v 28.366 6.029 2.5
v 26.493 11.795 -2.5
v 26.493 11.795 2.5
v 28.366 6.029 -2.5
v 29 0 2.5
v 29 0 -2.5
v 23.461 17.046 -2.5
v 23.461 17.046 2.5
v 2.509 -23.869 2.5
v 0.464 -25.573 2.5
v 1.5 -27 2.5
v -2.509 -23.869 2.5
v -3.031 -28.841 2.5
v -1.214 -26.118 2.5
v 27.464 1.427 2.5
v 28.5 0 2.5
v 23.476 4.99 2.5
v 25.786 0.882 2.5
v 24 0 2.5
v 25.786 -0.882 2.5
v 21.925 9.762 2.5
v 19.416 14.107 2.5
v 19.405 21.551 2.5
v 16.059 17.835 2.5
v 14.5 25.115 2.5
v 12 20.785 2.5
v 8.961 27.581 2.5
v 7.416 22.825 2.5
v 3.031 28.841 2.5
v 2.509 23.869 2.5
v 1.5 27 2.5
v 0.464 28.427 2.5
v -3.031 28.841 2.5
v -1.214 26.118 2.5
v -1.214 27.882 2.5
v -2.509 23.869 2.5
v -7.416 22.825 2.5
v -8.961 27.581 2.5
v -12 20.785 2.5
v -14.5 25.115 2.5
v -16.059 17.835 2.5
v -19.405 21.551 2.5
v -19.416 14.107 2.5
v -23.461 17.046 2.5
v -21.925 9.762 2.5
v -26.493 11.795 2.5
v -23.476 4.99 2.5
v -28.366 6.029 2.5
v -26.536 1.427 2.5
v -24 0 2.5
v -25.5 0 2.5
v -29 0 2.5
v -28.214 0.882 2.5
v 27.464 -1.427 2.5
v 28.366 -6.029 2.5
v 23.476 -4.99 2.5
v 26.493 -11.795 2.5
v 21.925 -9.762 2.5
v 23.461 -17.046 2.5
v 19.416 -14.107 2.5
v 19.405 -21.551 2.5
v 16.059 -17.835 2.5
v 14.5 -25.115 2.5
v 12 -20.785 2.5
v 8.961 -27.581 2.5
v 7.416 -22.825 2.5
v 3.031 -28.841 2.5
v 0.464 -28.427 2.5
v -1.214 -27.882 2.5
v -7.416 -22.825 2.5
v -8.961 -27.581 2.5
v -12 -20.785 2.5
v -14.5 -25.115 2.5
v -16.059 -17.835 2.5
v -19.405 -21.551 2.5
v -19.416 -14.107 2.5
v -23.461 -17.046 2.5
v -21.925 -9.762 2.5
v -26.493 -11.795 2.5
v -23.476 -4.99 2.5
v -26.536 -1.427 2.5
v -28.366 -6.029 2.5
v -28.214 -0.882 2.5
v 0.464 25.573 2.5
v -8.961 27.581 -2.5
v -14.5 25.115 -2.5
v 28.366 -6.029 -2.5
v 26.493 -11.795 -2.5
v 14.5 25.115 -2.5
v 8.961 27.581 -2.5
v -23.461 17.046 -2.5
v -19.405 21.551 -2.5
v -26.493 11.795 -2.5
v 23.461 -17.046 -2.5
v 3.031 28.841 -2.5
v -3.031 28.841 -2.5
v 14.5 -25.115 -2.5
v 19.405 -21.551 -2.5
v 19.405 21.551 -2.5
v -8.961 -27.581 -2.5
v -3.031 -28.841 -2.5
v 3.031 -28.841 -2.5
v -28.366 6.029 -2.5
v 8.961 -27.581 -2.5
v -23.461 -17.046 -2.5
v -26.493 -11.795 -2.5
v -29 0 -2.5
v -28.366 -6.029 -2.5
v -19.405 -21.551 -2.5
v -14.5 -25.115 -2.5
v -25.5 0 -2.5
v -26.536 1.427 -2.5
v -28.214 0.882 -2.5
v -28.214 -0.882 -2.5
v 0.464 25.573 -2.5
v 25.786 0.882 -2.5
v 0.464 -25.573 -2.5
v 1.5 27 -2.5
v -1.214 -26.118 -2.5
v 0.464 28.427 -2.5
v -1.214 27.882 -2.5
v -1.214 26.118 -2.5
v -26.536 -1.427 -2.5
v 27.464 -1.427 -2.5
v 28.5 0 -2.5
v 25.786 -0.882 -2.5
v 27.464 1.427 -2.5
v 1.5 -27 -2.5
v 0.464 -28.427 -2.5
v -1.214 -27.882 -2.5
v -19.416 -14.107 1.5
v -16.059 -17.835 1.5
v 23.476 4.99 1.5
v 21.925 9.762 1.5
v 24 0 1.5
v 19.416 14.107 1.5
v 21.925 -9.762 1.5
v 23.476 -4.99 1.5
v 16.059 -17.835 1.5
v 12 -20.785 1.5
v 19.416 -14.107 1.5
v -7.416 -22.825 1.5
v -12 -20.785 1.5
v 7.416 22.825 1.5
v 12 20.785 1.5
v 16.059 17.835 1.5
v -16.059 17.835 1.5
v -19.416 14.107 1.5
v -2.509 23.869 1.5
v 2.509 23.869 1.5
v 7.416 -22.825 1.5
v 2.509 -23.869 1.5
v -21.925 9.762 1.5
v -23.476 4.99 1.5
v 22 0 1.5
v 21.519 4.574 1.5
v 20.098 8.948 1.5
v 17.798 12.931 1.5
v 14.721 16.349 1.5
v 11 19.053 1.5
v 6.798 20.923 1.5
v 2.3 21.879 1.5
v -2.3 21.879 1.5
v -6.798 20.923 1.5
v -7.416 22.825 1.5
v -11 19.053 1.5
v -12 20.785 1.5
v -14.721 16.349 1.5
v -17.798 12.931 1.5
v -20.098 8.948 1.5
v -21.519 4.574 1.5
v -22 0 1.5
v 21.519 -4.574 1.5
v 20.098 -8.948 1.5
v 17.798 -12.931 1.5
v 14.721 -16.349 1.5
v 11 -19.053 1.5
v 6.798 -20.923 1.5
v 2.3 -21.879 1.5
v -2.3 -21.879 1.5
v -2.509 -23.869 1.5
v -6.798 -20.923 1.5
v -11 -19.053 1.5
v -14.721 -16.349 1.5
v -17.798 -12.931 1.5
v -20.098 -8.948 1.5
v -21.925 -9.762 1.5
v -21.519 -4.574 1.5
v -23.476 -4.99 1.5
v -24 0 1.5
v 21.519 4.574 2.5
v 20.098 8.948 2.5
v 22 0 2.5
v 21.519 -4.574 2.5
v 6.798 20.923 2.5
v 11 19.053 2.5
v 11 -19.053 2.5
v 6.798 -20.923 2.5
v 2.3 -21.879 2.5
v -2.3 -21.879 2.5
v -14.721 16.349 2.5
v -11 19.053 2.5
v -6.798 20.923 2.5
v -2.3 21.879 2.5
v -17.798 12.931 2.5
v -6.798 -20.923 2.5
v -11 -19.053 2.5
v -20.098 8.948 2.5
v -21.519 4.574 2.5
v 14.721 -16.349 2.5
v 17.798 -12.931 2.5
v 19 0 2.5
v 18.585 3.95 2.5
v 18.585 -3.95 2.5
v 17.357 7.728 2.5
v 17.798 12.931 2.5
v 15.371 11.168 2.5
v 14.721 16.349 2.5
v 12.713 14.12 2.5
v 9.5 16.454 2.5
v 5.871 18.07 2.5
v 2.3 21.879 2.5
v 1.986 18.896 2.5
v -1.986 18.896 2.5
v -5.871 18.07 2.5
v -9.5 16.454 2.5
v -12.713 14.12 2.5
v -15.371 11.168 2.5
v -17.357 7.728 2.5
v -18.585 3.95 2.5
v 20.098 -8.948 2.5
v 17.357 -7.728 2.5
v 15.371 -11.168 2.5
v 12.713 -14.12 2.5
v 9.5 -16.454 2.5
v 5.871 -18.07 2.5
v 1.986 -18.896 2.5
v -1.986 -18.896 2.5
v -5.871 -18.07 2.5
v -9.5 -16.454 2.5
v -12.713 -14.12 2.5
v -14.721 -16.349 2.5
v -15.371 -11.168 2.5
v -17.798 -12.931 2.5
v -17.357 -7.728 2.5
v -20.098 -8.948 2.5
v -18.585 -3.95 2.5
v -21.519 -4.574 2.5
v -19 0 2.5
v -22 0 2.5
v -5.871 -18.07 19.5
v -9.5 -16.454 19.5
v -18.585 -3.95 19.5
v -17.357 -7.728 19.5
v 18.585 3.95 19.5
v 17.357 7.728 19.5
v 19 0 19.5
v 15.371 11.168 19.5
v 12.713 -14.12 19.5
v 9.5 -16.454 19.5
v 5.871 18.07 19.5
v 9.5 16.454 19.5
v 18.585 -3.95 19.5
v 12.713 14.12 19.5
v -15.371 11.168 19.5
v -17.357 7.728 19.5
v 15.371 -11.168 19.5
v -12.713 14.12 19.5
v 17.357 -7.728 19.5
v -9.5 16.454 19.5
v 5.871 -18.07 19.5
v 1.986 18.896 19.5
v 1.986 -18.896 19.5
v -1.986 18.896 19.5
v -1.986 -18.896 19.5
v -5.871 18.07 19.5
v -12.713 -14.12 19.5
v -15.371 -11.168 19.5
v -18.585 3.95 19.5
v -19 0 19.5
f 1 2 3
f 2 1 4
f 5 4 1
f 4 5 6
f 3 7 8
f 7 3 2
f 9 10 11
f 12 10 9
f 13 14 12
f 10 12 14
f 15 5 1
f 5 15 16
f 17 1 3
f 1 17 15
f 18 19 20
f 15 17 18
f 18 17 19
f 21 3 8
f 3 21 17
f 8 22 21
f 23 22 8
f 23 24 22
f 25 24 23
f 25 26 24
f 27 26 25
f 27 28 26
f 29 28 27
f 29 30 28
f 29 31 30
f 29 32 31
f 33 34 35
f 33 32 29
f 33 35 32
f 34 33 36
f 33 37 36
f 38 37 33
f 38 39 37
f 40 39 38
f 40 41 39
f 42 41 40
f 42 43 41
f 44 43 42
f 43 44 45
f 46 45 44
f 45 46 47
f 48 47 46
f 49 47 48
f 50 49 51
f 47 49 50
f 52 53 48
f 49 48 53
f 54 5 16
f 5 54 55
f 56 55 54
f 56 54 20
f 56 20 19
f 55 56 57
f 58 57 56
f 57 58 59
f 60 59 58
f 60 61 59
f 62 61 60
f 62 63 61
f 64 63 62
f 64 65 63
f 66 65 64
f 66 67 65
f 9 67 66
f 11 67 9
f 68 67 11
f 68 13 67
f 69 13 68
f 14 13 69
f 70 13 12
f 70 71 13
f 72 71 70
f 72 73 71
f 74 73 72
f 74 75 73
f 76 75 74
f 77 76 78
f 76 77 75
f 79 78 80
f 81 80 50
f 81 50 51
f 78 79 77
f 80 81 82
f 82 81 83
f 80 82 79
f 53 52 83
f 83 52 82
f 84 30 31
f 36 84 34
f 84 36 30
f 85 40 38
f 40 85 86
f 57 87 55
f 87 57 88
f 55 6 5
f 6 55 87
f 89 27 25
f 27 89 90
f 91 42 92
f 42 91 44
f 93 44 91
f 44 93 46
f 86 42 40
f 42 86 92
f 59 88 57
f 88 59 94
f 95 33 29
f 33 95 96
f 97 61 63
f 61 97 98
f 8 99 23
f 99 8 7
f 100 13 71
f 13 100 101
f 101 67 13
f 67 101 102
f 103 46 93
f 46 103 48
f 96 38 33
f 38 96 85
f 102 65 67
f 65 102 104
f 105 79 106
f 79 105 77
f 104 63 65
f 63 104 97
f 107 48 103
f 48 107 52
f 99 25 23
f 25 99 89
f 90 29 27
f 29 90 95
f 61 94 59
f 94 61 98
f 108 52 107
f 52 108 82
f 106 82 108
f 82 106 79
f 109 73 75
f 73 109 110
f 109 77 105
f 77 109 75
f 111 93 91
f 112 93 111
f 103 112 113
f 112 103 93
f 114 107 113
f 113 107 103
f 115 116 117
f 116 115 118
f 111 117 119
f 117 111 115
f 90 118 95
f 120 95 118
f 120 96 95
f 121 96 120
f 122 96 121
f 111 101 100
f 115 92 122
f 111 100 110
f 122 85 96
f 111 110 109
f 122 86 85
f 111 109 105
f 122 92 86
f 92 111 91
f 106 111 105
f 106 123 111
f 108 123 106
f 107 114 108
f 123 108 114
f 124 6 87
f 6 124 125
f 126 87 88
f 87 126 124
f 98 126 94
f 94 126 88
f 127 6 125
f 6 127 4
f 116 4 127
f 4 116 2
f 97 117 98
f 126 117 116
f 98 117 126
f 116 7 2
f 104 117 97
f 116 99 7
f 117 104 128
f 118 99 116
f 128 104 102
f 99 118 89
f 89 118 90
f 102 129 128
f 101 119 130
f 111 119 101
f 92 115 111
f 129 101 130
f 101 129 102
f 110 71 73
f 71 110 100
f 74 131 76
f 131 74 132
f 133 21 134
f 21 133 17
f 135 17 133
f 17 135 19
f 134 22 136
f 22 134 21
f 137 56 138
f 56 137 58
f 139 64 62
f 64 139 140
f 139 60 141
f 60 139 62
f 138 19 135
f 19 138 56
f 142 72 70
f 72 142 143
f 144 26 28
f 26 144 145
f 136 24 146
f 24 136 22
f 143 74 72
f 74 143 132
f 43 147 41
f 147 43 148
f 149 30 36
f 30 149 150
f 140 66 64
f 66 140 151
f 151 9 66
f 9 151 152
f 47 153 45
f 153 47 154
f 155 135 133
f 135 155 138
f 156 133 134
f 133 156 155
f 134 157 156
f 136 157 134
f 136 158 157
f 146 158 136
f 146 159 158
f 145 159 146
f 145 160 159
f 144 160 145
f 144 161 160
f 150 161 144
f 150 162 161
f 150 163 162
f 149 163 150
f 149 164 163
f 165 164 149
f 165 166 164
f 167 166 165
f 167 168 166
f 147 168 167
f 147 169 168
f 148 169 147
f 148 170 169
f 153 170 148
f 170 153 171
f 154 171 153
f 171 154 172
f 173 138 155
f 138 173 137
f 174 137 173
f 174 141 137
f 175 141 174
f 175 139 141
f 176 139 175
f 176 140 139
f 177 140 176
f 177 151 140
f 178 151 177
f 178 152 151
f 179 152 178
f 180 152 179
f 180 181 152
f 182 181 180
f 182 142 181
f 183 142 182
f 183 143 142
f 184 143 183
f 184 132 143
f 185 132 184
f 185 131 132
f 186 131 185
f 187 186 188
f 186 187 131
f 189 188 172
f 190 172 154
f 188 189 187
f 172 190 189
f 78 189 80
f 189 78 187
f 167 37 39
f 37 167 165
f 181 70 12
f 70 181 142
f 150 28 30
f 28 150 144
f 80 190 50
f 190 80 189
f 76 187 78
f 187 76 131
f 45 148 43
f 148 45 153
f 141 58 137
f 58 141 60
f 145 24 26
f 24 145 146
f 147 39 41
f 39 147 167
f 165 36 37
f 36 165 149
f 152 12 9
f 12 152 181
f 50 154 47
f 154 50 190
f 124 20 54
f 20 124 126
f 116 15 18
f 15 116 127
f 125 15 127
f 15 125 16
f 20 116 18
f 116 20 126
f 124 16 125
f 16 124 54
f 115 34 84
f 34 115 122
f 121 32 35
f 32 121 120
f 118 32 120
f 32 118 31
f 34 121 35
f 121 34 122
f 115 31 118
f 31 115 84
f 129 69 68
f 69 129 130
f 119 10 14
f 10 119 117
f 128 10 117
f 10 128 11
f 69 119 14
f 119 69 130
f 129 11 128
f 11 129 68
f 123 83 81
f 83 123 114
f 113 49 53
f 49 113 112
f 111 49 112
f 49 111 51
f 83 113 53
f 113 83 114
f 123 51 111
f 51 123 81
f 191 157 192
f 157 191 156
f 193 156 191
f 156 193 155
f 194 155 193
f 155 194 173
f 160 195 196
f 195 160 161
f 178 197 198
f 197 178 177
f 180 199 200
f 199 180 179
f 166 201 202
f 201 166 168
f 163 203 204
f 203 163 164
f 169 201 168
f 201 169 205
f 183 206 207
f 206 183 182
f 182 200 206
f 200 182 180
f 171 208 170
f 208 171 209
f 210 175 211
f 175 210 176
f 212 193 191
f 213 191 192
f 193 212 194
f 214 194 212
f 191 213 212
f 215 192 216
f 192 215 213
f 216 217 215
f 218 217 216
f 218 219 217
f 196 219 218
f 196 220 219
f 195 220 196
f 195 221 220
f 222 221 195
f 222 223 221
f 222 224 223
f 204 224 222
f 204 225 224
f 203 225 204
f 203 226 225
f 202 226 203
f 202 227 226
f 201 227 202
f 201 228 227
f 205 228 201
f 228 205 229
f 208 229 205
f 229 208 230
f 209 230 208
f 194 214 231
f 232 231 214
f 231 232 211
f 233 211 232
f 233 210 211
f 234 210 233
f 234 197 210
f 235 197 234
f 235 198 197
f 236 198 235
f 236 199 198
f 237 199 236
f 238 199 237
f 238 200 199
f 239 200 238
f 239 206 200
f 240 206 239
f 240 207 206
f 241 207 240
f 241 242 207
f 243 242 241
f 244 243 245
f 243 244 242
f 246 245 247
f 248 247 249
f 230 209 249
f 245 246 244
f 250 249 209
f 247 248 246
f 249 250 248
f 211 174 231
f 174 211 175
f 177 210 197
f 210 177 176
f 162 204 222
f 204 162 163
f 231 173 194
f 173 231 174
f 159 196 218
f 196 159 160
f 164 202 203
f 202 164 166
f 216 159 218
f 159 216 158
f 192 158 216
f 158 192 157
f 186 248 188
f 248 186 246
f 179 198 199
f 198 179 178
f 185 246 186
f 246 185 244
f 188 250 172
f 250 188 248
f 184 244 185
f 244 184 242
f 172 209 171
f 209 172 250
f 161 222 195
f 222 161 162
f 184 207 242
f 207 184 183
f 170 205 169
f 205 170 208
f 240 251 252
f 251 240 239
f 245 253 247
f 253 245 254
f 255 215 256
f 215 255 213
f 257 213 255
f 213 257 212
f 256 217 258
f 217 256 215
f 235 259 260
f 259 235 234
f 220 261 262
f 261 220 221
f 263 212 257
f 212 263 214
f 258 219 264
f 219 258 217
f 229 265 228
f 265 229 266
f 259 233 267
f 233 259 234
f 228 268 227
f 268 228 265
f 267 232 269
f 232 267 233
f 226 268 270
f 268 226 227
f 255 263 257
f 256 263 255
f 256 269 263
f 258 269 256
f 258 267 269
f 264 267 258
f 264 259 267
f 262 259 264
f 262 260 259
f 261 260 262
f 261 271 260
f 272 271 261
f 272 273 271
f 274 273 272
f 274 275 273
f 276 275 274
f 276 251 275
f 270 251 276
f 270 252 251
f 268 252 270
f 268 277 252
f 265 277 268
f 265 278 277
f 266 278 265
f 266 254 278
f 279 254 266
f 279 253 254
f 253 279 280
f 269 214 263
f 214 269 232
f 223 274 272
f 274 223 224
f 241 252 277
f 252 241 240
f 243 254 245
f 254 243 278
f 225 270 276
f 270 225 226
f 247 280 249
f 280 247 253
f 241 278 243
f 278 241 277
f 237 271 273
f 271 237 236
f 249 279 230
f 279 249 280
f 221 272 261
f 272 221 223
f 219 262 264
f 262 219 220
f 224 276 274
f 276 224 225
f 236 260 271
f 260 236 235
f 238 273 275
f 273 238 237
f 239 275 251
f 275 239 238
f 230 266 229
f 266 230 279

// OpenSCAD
//modified elec windows

module windows (r1,r2,s_d)
{



difference(){
difference(){
difference(){
difference(){
difference(){
cylinder(r=r2/2, h=5, center = true);
    translate([0,0,3])
    cylinder(r = 48/2,h=3, center = true);}
    
    translate([27,0,0])
    cylinder(r = s_d,h=50, center = true);}
    
    translate([0,27,0])
    cylinder(r = s_d,h=50, center = true);}
    
    translate([0,-27,0])
    cylinder(r = s_d,h=50, center = true);}
    
    translate([-27,0,0])
    cylinder(r = s_d,h=50, center = true);}
    

cylinder(r=44/2, h=5, center = true);
   translate([0,0,8.5])
cylinder(r=r1/2, h=22, center = true); 



}

windows(38,58,1.5);
